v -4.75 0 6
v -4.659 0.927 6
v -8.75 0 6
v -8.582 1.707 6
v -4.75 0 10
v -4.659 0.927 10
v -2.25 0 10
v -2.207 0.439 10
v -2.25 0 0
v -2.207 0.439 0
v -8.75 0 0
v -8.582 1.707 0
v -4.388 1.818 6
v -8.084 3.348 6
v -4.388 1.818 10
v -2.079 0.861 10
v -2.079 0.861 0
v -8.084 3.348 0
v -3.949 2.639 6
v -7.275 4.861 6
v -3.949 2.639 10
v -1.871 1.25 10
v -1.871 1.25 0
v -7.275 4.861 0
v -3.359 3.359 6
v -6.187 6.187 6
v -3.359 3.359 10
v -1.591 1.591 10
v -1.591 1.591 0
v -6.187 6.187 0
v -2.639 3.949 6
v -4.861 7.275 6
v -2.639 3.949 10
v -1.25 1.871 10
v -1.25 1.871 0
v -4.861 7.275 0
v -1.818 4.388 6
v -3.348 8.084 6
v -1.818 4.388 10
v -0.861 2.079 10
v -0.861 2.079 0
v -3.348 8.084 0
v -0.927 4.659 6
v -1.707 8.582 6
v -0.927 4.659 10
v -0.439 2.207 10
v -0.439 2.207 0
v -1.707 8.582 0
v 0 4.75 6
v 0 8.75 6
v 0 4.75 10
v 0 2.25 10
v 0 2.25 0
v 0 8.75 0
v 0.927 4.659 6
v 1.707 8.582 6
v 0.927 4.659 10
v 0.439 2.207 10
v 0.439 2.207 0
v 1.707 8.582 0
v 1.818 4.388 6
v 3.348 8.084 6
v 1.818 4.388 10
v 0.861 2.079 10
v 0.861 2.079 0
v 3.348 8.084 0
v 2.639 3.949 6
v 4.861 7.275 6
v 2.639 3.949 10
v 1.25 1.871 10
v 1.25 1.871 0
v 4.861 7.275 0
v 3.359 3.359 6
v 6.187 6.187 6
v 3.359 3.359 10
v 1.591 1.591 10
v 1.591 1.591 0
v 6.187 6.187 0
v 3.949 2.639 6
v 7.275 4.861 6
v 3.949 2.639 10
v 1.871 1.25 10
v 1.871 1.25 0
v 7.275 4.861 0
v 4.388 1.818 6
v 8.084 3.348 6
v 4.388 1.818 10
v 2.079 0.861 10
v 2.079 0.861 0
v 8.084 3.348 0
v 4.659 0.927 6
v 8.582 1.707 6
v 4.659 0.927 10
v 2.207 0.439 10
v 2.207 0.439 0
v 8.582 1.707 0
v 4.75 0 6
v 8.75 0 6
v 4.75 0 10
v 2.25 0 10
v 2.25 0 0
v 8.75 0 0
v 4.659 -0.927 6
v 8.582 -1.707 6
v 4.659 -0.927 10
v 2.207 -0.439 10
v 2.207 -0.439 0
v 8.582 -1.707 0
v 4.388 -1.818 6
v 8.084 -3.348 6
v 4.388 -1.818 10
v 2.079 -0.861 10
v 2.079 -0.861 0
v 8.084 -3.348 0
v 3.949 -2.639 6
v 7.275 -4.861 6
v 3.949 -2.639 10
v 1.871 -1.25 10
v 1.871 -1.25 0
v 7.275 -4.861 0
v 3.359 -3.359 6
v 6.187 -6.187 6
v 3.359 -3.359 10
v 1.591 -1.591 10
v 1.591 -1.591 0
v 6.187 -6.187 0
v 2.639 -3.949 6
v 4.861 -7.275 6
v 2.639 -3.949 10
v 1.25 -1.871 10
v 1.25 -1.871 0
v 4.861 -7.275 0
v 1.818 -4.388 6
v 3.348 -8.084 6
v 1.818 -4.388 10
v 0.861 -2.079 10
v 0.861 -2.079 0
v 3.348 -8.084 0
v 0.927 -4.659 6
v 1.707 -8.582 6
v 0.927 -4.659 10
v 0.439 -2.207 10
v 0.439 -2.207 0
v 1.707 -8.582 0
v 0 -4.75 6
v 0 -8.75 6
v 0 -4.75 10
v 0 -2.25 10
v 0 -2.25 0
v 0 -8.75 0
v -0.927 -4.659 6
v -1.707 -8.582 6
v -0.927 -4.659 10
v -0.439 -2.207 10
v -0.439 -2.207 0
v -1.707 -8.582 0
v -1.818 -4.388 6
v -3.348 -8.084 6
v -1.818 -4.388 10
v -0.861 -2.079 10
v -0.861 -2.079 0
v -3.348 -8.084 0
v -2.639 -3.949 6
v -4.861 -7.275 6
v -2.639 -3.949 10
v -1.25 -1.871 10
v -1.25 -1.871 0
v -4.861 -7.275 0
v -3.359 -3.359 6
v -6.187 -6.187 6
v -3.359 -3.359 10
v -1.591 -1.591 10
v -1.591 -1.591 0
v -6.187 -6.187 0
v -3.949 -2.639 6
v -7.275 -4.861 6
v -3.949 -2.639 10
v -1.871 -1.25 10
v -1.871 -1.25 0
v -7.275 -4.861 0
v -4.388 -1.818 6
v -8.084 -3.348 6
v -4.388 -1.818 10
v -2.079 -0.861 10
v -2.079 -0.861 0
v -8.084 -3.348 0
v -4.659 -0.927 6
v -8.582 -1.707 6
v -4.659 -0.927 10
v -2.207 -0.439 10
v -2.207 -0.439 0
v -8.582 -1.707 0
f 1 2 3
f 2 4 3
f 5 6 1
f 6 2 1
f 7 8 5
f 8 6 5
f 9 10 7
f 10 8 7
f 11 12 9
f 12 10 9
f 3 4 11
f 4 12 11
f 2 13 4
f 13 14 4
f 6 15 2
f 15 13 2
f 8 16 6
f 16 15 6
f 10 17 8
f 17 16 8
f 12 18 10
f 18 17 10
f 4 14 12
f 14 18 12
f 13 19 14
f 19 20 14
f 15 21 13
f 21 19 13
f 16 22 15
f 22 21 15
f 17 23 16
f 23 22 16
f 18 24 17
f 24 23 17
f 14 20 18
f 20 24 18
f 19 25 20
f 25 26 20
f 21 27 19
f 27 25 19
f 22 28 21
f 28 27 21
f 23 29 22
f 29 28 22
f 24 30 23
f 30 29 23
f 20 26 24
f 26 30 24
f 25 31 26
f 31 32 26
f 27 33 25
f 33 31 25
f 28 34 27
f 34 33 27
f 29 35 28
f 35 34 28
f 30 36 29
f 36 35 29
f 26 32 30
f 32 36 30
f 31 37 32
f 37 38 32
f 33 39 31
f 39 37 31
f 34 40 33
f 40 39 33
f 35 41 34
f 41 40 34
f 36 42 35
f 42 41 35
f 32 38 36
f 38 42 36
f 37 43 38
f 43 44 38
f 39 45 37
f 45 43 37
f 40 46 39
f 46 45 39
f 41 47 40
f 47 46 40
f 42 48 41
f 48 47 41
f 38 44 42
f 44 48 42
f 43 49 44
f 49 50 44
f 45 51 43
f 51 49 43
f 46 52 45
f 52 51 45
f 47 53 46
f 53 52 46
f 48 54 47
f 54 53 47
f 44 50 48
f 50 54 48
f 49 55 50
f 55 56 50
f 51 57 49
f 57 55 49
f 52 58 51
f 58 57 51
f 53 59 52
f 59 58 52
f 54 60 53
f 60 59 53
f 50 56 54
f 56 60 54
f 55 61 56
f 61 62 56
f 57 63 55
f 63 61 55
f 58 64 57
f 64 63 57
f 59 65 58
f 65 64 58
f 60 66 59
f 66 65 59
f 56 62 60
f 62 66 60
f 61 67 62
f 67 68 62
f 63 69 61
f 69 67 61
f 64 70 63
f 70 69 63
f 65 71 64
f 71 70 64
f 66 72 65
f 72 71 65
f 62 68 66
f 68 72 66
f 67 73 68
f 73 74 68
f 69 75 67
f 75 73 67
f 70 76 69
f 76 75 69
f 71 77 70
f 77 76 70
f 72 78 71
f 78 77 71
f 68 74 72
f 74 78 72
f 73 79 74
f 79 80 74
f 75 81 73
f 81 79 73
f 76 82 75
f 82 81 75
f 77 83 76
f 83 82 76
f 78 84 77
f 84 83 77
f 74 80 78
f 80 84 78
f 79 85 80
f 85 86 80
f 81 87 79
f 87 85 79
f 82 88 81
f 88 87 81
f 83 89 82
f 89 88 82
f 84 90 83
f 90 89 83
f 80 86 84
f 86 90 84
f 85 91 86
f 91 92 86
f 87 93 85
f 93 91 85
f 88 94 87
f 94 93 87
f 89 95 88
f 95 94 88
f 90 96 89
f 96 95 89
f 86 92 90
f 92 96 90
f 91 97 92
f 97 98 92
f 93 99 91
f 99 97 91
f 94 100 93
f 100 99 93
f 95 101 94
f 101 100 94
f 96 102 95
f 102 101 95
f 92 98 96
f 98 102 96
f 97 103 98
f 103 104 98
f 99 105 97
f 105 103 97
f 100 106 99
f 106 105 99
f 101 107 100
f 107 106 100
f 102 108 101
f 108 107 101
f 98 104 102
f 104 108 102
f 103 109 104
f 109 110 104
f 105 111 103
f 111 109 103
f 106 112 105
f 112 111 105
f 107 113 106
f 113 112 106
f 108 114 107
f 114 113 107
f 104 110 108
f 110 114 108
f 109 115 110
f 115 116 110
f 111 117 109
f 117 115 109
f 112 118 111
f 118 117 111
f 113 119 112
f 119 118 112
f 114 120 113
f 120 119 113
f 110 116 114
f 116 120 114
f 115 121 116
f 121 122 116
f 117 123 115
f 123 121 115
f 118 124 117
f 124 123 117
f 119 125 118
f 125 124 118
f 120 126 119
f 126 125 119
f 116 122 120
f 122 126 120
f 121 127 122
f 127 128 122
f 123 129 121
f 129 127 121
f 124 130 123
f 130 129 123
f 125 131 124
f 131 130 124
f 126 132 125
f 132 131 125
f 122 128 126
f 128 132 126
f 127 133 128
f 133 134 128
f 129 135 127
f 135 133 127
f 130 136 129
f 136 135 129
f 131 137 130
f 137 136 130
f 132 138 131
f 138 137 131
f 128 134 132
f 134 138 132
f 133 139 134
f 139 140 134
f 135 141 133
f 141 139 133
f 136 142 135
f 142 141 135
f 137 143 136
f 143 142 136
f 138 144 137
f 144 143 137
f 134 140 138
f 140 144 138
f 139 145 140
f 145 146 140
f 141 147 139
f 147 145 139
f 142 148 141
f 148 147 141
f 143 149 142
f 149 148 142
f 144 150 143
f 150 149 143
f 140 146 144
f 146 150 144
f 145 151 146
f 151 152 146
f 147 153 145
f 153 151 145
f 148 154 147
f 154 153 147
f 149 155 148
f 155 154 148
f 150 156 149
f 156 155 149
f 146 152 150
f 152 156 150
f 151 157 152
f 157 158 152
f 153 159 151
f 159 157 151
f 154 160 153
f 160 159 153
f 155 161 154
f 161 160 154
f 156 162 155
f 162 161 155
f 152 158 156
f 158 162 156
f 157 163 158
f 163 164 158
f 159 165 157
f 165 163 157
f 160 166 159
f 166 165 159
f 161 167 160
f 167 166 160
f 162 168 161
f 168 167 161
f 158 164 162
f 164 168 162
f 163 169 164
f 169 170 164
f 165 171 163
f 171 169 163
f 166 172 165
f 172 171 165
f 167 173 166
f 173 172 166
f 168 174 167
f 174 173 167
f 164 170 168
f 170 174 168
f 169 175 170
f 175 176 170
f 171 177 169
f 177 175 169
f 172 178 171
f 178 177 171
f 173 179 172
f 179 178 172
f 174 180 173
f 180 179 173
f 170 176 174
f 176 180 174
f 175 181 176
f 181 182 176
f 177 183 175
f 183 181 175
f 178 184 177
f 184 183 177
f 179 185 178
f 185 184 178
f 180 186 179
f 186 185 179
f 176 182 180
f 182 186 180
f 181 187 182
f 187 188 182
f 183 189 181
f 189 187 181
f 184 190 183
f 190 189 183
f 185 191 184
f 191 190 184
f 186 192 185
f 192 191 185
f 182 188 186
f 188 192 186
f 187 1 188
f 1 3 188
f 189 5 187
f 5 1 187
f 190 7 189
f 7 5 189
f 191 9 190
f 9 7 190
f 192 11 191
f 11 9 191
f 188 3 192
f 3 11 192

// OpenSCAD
$fn = 32;

// ----------------------------------------------------------------------
// Form washer: stepped_c washer, 17.5 mm outside, 4.5 mm bore
// ----------------------------------------------------------------------

// --- parameters (mm) ---
revolve_angle = 360;      // full turn around the Z axis
profile_points = 6;       // points of the closed outline

profile = [[2.25, 0], [8.75, 0], [8.75, 6], [4.75, 6], [4.75, 10], [2.25, 10]];  // single closed polygon, 6 points, counter clockwise

// --- the one profile operation ---
rotate_extrude(angle = revolve_angle) polygon(points = profile);
